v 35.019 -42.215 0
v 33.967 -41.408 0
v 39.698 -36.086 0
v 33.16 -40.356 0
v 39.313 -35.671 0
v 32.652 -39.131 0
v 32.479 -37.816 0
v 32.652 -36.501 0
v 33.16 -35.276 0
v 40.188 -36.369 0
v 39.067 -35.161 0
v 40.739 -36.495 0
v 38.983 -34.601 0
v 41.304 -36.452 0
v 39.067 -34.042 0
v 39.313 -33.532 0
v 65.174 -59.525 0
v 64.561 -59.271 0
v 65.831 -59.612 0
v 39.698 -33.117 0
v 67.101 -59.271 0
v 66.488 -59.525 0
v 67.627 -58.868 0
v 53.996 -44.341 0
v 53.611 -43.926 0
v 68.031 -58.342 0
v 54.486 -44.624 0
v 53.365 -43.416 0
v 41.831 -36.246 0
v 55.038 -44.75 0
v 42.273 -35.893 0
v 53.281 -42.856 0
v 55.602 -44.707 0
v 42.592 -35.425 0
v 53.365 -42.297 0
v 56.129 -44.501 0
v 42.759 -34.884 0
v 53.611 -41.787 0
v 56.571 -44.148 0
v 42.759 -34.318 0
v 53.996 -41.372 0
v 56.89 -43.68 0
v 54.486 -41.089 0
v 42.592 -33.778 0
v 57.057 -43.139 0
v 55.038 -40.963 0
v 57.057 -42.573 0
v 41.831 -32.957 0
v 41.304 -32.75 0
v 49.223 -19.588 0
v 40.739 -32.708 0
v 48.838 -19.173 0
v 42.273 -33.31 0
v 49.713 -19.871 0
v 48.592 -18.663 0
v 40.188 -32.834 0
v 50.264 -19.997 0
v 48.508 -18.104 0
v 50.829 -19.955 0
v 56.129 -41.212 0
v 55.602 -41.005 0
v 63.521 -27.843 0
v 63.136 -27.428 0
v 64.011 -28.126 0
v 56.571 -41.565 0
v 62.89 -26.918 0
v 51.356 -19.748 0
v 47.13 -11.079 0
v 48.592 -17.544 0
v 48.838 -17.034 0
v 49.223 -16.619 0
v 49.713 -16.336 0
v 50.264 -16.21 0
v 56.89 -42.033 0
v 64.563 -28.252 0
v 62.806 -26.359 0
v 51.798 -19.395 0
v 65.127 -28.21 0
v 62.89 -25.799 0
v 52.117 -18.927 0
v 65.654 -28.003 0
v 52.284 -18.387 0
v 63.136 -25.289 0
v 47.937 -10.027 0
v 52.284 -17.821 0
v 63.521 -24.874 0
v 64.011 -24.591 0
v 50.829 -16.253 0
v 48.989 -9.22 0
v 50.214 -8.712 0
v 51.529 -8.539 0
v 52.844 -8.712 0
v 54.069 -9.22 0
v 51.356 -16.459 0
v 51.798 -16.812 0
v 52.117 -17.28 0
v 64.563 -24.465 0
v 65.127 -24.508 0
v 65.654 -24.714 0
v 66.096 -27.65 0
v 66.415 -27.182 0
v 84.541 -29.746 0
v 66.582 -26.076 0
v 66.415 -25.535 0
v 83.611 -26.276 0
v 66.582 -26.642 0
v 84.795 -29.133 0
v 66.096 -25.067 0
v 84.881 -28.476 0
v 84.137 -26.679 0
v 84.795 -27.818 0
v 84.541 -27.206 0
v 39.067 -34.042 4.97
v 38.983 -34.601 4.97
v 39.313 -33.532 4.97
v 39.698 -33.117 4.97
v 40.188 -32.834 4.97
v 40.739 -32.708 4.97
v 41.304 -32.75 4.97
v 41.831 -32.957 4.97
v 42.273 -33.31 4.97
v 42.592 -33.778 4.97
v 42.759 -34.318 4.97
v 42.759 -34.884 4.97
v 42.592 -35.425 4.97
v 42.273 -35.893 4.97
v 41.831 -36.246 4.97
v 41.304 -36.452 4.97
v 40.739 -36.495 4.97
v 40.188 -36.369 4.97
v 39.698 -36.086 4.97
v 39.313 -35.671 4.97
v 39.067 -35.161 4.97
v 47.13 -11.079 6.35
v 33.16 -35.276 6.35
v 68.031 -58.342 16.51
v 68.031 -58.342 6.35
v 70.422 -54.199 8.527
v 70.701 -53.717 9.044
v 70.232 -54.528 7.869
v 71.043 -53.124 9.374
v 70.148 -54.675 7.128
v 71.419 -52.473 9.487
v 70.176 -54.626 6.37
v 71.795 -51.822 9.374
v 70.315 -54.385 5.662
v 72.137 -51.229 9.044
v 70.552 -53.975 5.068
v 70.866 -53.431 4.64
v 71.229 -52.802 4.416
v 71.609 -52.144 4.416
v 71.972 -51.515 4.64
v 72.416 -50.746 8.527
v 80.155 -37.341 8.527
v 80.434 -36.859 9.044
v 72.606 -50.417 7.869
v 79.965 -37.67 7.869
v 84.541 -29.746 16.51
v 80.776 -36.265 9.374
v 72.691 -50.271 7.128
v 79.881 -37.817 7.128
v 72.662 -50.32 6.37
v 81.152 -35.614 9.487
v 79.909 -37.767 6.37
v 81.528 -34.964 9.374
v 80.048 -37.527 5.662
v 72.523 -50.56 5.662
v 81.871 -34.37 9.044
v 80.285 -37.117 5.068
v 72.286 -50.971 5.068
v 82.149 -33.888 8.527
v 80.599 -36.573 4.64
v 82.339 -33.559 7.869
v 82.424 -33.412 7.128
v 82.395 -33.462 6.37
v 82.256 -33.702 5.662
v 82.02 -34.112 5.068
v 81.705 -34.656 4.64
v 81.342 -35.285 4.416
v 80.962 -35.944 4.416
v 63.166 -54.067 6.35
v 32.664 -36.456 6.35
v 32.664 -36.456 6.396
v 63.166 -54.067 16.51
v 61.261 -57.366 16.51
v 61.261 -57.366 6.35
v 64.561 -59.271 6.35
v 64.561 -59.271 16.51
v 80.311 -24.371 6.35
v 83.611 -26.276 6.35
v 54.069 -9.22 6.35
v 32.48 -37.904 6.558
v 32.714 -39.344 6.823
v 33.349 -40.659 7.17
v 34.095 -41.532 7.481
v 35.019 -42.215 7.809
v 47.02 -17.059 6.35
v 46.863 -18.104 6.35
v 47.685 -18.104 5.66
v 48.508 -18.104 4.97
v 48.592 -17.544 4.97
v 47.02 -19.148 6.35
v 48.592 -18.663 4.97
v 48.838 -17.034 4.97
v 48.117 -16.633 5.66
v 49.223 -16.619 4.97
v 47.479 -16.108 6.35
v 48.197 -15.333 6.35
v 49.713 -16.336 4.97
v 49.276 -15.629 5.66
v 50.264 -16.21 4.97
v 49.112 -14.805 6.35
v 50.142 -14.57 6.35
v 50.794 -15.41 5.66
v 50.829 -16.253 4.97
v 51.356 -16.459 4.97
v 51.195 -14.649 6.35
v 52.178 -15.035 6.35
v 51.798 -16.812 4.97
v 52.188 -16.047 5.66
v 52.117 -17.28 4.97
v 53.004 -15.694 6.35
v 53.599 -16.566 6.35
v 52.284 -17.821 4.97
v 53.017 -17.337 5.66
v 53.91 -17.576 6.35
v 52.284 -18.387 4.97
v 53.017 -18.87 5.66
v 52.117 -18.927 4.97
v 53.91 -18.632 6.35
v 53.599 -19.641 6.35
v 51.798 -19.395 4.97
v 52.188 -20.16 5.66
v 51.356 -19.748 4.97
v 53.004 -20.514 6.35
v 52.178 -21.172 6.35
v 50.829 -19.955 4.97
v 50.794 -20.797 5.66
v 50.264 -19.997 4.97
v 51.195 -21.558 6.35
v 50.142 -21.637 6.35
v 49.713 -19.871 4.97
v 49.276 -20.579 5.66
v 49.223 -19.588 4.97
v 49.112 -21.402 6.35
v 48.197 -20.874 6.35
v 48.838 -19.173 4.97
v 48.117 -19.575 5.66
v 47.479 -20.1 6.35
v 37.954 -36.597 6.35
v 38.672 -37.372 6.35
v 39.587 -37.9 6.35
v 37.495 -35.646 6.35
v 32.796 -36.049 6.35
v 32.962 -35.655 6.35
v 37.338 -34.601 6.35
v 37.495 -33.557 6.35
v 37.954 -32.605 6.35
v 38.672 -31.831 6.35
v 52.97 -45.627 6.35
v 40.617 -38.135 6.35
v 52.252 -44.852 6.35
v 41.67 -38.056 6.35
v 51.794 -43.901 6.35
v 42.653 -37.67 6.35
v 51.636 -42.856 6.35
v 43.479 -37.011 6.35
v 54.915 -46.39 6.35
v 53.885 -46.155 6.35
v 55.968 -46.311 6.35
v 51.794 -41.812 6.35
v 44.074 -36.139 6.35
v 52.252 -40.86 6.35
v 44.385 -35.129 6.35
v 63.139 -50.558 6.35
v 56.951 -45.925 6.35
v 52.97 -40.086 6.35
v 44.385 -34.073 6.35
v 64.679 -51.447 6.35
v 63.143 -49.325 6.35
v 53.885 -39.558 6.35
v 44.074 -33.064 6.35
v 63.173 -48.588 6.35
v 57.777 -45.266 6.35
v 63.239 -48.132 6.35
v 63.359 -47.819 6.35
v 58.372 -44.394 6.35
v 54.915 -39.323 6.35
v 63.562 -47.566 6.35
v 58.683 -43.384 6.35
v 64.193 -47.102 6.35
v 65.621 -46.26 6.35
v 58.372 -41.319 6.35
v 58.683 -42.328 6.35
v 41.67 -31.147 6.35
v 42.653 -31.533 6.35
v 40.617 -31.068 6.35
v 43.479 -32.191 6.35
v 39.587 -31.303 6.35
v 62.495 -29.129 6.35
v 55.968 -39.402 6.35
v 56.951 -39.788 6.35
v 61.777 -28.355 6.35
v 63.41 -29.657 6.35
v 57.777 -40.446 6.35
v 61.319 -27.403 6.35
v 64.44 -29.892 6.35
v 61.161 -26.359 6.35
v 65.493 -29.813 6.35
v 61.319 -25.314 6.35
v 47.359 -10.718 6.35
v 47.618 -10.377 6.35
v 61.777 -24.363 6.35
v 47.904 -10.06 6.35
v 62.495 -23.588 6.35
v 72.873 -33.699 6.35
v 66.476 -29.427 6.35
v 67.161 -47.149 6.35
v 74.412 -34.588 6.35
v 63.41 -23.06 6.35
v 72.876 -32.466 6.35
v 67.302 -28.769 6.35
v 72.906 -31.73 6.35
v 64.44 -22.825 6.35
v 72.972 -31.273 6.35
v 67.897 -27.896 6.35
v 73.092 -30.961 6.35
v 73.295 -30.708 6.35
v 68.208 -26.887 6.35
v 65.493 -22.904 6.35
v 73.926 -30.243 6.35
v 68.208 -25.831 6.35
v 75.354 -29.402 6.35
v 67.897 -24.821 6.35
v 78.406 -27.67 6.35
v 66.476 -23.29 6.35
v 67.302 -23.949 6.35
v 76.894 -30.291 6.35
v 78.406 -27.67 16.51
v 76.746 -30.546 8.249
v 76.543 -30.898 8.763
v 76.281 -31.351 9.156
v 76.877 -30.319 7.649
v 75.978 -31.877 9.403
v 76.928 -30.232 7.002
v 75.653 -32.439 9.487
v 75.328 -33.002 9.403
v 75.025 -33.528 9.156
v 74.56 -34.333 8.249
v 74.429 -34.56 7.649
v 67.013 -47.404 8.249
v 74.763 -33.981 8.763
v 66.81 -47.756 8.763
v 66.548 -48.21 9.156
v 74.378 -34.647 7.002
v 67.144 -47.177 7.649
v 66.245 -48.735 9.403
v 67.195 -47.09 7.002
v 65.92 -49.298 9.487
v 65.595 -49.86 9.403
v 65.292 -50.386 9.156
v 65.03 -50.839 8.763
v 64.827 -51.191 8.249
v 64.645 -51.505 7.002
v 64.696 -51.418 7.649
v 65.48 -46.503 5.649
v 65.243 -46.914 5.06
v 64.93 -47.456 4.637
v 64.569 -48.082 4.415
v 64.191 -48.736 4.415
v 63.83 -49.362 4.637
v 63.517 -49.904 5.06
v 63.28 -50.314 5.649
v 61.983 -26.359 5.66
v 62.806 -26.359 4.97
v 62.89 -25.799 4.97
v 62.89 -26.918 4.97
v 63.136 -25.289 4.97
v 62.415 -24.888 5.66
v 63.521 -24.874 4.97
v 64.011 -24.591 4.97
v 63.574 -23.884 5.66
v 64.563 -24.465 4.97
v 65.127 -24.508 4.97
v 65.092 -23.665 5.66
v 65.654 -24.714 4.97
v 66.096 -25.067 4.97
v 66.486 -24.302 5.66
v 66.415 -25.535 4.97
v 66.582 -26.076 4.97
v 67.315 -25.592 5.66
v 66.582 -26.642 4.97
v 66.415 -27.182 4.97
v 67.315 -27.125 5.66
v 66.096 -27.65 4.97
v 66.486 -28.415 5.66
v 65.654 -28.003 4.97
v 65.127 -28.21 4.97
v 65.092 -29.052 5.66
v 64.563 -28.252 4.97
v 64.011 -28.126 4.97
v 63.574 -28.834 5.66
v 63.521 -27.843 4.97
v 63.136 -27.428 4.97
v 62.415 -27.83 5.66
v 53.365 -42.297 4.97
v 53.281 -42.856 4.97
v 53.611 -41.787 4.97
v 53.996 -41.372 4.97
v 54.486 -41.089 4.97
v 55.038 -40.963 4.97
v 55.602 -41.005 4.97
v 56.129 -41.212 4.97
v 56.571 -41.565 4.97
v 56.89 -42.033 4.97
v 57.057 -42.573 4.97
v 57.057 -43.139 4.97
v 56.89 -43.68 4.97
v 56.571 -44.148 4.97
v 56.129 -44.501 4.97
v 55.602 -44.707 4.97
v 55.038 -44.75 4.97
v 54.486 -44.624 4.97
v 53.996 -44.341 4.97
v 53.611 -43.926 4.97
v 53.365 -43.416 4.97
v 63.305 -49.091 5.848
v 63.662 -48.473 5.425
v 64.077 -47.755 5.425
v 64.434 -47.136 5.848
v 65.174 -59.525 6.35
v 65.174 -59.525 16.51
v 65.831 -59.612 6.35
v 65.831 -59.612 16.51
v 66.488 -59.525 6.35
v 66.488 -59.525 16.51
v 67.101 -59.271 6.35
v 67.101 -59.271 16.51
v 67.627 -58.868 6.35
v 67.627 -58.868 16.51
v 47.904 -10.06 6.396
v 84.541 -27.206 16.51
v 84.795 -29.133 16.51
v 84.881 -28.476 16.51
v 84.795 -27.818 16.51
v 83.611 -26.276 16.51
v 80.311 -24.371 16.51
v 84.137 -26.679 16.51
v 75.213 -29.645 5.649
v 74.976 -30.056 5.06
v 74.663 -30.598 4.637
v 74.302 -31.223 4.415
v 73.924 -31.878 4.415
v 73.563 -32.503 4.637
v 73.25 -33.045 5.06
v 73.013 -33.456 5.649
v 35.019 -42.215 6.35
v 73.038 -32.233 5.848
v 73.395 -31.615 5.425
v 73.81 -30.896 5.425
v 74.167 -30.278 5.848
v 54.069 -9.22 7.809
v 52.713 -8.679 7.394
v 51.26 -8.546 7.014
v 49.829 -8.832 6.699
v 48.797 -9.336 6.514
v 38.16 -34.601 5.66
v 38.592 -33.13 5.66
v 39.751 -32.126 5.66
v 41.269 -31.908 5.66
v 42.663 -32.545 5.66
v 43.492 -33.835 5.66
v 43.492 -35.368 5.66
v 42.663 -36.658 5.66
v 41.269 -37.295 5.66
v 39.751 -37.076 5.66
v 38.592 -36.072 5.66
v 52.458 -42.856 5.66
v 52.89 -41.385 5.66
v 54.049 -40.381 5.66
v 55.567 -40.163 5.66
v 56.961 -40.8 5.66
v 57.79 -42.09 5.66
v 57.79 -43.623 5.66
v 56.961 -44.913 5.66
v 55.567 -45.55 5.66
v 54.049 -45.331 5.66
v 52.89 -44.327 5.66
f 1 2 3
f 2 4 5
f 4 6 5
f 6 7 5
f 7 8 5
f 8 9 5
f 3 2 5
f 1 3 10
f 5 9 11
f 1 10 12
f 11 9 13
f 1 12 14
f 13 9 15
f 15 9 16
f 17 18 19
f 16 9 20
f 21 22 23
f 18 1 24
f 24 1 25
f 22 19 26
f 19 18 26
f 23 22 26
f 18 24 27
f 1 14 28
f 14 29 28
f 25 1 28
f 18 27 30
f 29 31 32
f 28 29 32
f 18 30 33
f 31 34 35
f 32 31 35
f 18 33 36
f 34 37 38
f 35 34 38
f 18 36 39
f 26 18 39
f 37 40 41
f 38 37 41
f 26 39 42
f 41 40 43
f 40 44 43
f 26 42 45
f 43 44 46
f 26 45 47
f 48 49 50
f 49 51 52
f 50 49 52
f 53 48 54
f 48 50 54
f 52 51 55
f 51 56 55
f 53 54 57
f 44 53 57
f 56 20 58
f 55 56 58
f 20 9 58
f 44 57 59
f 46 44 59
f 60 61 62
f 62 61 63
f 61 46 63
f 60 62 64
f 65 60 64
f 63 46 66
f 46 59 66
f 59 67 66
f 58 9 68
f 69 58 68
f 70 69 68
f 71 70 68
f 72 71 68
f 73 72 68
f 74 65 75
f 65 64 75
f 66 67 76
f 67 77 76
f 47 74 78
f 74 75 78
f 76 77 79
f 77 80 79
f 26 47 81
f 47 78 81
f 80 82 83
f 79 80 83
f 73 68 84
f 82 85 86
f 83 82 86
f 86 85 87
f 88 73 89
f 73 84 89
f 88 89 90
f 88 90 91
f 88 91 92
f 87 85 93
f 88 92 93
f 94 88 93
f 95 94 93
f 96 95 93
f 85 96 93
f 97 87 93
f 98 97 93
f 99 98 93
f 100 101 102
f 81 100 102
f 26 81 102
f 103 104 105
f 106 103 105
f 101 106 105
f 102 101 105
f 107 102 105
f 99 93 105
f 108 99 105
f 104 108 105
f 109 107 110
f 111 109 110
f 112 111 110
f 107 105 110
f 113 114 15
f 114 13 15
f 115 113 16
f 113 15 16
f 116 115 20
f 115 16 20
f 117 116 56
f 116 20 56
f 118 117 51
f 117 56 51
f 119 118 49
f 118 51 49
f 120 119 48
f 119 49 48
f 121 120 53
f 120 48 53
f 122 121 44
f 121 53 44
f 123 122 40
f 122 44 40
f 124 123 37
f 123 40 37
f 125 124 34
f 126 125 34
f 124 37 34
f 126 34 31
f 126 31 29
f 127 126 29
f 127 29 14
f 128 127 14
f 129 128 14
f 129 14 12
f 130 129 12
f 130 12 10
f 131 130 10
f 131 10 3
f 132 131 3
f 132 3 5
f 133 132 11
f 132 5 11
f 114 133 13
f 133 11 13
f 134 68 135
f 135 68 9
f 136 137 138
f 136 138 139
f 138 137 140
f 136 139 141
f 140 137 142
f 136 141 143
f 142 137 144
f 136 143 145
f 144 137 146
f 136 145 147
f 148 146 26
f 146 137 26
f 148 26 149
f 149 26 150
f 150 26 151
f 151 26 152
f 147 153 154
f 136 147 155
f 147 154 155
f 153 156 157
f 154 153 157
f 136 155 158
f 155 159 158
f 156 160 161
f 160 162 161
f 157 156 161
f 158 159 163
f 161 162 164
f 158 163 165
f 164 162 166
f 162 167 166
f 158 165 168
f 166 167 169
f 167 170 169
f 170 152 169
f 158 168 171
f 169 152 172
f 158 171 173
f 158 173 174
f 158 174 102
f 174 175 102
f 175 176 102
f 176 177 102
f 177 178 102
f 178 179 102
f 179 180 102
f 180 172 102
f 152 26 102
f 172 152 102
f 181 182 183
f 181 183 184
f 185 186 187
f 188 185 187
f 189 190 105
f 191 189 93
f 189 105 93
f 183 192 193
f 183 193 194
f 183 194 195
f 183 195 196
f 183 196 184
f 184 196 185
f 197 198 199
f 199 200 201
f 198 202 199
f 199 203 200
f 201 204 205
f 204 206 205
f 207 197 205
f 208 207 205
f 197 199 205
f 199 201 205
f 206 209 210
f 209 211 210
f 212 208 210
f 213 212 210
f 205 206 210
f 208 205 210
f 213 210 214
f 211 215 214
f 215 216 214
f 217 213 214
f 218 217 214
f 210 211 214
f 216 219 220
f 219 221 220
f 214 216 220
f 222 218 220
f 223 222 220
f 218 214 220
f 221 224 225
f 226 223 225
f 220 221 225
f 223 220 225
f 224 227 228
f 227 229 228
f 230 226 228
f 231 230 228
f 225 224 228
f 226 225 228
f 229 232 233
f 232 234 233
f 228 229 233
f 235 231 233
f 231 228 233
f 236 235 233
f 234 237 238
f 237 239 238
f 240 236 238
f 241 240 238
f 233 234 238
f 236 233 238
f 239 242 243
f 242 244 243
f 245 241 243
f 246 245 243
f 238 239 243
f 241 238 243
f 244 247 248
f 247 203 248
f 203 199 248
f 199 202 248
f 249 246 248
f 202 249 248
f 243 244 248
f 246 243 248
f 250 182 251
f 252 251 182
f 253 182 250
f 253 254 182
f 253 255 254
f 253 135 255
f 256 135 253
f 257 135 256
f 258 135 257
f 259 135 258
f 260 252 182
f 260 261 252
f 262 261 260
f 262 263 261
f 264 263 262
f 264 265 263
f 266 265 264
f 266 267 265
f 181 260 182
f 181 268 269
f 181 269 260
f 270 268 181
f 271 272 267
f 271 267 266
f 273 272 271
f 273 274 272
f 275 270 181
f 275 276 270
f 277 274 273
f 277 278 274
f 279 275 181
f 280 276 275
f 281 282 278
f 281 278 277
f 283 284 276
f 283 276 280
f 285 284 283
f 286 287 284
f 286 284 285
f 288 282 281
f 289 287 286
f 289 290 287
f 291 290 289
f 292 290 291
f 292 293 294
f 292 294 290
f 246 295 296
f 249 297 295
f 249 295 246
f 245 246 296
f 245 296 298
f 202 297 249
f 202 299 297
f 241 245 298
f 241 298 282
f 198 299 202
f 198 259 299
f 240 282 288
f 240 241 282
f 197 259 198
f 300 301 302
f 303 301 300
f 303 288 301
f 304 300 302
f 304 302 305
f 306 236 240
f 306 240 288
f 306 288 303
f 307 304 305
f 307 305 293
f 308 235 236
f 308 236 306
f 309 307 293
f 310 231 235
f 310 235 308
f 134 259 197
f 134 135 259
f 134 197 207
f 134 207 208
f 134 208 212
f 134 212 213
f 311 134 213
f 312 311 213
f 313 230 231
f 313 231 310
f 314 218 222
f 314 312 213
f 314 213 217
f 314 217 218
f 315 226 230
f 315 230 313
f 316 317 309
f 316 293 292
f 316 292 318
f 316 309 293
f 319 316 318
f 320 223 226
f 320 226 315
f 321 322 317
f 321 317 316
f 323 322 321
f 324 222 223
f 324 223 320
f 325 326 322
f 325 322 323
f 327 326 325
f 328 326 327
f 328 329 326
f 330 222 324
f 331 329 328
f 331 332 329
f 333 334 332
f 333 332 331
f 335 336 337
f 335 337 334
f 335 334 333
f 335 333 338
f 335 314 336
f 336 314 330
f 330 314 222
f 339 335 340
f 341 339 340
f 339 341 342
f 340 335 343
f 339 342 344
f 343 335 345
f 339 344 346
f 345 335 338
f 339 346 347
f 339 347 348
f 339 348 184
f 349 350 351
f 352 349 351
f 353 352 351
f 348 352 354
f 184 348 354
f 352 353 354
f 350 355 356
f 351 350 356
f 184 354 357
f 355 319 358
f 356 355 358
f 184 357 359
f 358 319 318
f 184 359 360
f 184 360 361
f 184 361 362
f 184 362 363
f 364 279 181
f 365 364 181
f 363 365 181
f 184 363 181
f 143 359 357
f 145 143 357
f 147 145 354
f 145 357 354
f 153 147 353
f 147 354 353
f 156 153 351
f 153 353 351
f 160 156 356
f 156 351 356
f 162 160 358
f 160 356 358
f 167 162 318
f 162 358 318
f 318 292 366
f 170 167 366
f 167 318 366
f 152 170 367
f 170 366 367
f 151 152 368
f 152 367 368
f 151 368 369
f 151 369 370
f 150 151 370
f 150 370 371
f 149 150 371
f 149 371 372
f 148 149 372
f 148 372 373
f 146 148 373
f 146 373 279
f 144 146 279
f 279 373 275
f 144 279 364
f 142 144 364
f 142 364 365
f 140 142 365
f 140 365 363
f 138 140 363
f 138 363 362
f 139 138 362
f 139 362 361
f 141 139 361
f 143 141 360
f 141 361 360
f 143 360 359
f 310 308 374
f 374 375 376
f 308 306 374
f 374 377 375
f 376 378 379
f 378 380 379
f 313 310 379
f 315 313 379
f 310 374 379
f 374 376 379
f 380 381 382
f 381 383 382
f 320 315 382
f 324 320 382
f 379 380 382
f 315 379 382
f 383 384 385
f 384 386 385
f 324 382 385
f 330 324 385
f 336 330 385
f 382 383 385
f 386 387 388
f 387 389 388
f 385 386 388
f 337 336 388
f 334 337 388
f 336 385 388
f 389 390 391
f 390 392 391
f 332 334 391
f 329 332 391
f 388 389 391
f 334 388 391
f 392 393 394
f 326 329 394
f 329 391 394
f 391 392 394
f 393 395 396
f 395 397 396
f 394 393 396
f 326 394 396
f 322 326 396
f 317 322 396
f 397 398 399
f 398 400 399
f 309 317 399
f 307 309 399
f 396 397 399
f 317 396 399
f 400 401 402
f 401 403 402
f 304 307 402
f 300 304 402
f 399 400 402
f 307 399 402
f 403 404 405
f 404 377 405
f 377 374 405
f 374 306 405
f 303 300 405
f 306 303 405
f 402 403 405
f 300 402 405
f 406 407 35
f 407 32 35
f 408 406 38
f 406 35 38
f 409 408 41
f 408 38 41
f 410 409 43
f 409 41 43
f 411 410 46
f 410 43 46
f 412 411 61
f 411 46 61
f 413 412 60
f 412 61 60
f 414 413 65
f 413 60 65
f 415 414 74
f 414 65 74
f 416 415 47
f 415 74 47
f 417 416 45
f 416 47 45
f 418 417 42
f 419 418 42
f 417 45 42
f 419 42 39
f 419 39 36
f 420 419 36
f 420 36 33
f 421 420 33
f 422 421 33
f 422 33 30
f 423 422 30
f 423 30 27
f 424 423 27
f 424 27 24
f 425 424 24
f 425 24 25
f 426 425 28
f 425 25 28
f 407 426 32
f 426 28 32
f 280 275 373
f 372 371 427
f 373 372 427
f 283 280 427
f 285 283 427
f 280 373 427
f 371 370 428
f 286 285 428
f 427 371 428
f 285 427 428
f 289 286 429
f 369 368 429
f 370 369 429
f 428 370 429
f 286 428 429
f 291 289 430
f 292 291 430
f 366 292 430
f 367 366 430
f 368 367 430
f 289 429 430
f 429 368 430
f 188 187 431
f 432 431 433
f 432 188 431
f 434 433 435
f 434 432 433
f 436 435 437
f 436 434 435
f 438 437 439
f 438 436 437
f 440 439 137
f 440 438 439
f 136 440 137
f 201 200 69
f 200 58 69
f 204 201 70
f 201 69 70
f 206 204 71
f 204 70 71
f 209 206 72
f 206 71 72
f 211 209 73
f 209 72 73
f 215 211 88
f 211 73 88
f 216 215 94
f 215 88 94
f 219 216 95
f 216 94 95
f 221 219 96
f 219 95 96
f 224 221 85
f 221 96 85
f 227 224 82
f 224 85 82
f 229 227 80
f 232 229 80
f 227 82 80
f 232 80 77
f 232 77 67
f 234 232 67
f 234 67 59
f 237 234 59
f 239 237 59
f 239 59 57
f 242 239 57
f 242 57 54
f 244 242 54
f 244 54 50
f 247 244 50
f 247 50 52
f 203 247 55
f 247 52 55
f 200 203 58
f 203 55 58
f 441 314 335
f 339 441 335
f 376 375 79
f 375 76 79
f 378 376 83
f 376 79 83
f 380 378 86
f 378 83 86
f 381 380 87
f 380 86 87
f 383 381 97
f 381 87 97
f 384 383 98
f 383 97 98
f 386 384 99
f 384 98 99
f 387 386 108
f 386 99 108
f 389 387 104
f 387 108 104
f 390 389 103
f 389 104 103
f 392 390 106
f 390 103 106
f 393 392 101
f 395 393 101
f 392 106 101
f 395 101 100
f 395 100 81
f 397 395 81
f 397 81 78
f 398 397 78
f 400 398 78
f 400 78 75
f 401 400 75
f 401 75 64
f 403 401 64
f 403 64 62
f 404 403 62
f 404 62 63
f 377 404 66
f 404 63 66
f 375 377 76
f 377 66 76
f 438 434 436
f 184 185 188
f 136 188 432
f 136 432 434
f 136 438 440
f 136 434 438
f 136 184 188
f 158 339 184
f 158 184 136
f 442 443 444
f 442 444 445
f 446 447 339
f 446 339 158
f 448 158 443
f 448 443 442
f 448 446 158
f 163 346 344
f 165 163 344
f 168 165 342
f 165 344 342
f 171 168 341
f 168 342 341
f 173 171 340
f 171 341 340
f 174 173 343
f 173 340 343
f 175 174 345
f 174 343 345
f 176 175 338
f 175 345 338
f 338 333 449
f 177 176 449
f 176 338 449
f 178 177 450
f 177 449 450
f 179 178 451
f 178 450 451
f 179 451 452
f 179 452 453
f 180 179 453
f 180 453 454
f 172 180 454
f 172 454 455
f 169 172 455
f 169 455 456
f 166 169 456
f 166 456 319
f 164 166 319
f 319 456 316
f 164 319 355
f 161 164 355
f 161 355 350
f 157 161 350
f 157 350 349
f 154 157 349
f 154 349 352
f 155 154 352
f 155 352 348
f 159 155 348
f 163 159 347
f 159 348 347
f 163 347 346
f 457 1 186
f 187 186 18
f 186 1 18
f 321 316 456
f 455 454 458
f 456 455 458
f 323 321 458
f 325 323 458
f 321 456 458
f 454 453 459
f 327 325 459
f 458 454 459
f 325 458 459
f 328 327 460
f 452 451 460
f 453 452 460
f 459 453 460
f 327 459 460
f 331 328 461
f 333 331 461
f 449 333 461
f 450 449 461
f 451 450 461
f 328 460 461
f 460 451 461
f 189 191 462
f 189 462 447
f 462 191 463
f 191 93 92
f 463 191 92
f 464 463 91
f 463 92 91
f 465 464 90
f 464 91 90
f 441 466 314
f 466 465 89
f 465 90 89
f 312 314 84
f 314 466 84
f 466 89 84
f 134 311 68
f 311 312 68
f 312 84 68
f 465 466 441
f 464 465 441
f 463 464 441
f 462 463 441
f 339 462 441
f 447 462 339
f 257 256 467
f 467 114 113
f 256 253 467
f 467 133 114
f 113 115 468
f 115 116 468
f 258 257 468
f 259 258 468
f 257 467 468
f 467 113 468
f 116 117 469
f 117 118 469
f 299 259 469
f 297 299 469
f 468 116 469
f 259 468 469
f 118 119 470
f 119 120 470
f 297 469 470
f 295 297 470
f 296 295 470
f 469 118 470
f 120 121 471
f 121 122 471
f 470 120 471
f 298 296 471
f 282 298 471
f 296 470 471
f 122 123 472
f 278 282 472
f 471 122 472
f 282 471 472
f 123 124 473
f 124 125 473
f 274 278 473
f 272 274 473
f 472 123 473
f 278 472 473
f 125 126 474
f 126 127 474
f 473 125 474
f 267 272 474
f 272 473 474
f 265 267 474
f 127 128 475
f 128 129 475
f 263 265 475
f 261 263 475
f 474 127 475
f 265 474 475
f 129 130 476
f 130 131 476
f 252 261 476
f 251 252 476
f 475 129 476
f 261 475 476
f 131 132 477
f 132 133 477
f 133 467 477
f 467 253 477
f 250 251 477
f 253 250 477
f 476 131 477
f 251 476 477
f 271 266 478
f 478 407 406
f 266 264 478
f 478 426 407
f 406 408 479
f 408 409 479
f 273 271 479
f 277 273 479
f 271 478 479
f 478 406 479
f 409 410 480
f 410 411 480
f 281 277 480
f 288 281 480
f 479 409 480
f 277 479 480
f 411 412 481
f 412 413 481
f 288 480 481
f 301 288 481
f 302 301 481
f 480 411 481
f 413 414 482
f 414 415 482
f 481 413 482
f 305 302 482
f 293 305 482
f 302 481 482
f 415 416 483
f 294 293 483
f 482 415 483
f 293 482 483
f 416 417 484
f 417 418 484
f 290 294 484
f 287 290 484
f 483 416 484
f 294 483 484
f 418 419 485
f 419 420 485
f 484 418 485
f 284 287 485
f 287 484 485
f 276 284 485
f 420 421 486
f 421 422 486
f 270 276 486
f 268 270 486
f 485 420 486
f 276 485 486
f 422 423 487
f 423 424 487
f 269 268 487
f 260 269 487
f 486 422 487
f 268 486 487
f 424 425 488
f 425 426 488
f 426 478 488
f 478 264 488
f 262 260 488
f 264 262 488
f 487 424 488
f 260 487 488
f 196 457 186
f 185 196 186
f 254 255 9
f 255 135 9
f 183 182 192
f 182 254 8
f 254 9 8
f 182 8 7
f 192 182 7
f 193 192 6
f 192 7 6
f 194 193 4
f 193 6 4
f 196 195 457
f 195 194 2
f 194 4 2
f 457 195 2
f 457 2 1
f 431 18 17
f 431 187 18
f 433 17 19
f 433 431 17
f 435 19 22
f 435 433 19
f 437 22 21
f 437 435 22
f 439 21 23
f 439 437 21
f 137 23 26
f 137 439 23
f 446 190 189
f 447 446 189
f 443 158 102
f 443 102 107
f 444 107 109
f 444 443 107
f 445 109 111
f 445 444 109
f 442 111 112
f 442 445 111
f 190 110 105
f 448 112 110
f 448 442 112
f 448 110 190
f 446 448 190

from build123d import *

# Parameters (mm, degrees)
BOSS_EXTRUDE1_DEPTH                               = 6.35
BOSS_EXTRUDE2_DEPTH                               = 10.16
BOSS_EXTRUDE3_DEPTH                               = 3.81
F_5_1_5_1_DIAMETER_HOLE1_D                        = 5.1
F_5_1_5_1_DIAMETER_HOLE1_DEPTH                    = 8.128
F_5_1_5_1_DIAMETER_HOLE1_TIP                      = 1.532194579
CSK_FOR_6_FLAT_HEAD_MACHINE_SCREW_100_D           = 3.7973
CSK_FOR_6_FLAT_HEAD_MACHINE_SCREW_100_CSINK_D     = 7.0866
CSK_FOR_6_FLAT_HEAD_MACHINE_SCREW_100_CSINK_ANGLE = 100
FILLET1_R                                         = 5.08
FILLET2_R                                         = 2.54


with BuildPart() as part:
    # Sketch2 → Boss-Extrude1 (new body)
    with BuildSketch(Plane.XY):
        Polygon((30.619607592, -39.675283942), (66.760752948, -60.541383942), (85.810752948, -27.545816058), (49.669607592, -6.679716058), align=None)
    extrude(amount=BOSS_EXTRUDE1_DEPTH)

    # Sketch3 → Boss-Extrude2 (add)
    with BuildSketch(Plane.XY.offset(6.35)):
        Polygon((80.311491634, -24.370816058), (61.261491634, -57.366383942), (66.760752948, -60.541383942), (85.810752948, -27.545816058), align=None)
    extrude(amount=BOSS_EXTRUDE2_DEPTH)

    # Sketch4 → Boss-Extrude3 (add)
    with BuildSketch(Plane(origin=(9.525, 16.497783942, 0), x_dir=(0.8660254037844388, -0.4999999999999997, 0), z_dir=(0.49999999999999983, 0.8660254037844389, 0))):
        Polygon((46.355, -6.35), (81.7372, -16.51), (81.7372, -6.35), align=None)
    boss_extrude3 = extrude(amount=-BOSS_EXTRUDE3_DEPTH)

    # Mirror1: Boss-Extrude3 across plane
    add(boss_extrude3.mirror(Plane(origin=(0, 0, 0), x_dir=(0, 0, 1), z_dir=(0.4999999999999997, 0.8660254037844389, 0))))

    # Ø5.1 (5.1) Diameter Hole1
    with Locations(Plane(origin=(76.285752948, -44.0436, 0), x_dir=(0, 0, -1), z_dir=(0.8660254037844385, -0.5000000000000004, 0))):
        with Locations((-6.937306149, 9.733087598), (-6.937306149, -9.733087598)):
            Hole(F_5_1_5_1_DIAMETER_HOLE1_D / 2, depth=F_5_1_5_1_DIAMETER_HOLE1_DEPTH)
            with Locations((0, 0, -(F_5_1_5_1_DIAMETER_HOLE1_DEPTH + F_5_1_5_1_DIAMETER_HOLE1_TIP / 2))):  # 118° drill point
                Cone(0, F_5_1_5_1_DIAMETER_HOLE1_D / 2, F_5_1_5_1_DIAMETER_HOLE1_TIP, mode=Mode.SUBTRACT)

    # CSK for #6 Flat Head Machine Screw (100)1 (through all)
    with Locations(Plane.XY.offset(6.35)):
        with Locations((40.881368906, -34.601391971), (50.406368906, -18.103608029), (64.704448323, -26.358608029), (55.179448323, -42.856391971)):
            CounterSinkHole(CSK_FOR_6_FLAT_HEAD_MACHINE_SCREW_100_D / 2, CSK_FOR_6_FLAT_HEAD_MACHINE_SCREW_100_CSINK_D / 2, counter_sink_angle=CSK_FOR_6_FLAT_HEAD_MACHINE_SCREW_100_CSINK_ANGLE)

    # Fillet1
    # the kernel refuses this fillet: 5.08 mm, written as the material it takes off along each edge
    with BuildSketch(Plane(origin=(49.669607592, -6.679716058, -12.7), x_dir=(0.8660254037844385, -0.5000000000000002, 0), z_dir=(0, 0, 1))) as fillet1_piece_1:
        with BuildLine():
            CenterArc((FILLET1_R, -FILLET1_R), FILLET1_R, 90, 90)
            Line((0, -FILLET1_R), (0, 0))
            Line((0, 0), (FILLET1_R, 0))
        make_face()
    extrude(amount=31.75, mode=Mode.SUBTRACT)
    with BuildSketch(Plane(origin=(30.619607592, -39.675283942, -12.7), x_dir=(0.8660254037844386, -0.5, 0), z_dir=(0, 0, 1))) as fillet1_piece_2:
        with BuildLine():
            CenterArc((FILLET1_R, FILLET1_R), FILLET1_R, 180, 90)
            Line((0, FILLET1_R), (0, 0))
            Line((0, 0), (FILLET1_R, 0))
        make_face()
    extrude(amount=31.75, mode=Mode.SUBTRACT)

    # Fillet2
    fillet2_edges = [part.edges().sort_by_distance(p)[0] for p in [
        (85.810752948, -27.545816058, 8.255),
        (66.760752948, -60.541383942, 8.255),
    ]]
    fillet(fillet2_edges, radius=FILLET2_R)


solid = part.part
